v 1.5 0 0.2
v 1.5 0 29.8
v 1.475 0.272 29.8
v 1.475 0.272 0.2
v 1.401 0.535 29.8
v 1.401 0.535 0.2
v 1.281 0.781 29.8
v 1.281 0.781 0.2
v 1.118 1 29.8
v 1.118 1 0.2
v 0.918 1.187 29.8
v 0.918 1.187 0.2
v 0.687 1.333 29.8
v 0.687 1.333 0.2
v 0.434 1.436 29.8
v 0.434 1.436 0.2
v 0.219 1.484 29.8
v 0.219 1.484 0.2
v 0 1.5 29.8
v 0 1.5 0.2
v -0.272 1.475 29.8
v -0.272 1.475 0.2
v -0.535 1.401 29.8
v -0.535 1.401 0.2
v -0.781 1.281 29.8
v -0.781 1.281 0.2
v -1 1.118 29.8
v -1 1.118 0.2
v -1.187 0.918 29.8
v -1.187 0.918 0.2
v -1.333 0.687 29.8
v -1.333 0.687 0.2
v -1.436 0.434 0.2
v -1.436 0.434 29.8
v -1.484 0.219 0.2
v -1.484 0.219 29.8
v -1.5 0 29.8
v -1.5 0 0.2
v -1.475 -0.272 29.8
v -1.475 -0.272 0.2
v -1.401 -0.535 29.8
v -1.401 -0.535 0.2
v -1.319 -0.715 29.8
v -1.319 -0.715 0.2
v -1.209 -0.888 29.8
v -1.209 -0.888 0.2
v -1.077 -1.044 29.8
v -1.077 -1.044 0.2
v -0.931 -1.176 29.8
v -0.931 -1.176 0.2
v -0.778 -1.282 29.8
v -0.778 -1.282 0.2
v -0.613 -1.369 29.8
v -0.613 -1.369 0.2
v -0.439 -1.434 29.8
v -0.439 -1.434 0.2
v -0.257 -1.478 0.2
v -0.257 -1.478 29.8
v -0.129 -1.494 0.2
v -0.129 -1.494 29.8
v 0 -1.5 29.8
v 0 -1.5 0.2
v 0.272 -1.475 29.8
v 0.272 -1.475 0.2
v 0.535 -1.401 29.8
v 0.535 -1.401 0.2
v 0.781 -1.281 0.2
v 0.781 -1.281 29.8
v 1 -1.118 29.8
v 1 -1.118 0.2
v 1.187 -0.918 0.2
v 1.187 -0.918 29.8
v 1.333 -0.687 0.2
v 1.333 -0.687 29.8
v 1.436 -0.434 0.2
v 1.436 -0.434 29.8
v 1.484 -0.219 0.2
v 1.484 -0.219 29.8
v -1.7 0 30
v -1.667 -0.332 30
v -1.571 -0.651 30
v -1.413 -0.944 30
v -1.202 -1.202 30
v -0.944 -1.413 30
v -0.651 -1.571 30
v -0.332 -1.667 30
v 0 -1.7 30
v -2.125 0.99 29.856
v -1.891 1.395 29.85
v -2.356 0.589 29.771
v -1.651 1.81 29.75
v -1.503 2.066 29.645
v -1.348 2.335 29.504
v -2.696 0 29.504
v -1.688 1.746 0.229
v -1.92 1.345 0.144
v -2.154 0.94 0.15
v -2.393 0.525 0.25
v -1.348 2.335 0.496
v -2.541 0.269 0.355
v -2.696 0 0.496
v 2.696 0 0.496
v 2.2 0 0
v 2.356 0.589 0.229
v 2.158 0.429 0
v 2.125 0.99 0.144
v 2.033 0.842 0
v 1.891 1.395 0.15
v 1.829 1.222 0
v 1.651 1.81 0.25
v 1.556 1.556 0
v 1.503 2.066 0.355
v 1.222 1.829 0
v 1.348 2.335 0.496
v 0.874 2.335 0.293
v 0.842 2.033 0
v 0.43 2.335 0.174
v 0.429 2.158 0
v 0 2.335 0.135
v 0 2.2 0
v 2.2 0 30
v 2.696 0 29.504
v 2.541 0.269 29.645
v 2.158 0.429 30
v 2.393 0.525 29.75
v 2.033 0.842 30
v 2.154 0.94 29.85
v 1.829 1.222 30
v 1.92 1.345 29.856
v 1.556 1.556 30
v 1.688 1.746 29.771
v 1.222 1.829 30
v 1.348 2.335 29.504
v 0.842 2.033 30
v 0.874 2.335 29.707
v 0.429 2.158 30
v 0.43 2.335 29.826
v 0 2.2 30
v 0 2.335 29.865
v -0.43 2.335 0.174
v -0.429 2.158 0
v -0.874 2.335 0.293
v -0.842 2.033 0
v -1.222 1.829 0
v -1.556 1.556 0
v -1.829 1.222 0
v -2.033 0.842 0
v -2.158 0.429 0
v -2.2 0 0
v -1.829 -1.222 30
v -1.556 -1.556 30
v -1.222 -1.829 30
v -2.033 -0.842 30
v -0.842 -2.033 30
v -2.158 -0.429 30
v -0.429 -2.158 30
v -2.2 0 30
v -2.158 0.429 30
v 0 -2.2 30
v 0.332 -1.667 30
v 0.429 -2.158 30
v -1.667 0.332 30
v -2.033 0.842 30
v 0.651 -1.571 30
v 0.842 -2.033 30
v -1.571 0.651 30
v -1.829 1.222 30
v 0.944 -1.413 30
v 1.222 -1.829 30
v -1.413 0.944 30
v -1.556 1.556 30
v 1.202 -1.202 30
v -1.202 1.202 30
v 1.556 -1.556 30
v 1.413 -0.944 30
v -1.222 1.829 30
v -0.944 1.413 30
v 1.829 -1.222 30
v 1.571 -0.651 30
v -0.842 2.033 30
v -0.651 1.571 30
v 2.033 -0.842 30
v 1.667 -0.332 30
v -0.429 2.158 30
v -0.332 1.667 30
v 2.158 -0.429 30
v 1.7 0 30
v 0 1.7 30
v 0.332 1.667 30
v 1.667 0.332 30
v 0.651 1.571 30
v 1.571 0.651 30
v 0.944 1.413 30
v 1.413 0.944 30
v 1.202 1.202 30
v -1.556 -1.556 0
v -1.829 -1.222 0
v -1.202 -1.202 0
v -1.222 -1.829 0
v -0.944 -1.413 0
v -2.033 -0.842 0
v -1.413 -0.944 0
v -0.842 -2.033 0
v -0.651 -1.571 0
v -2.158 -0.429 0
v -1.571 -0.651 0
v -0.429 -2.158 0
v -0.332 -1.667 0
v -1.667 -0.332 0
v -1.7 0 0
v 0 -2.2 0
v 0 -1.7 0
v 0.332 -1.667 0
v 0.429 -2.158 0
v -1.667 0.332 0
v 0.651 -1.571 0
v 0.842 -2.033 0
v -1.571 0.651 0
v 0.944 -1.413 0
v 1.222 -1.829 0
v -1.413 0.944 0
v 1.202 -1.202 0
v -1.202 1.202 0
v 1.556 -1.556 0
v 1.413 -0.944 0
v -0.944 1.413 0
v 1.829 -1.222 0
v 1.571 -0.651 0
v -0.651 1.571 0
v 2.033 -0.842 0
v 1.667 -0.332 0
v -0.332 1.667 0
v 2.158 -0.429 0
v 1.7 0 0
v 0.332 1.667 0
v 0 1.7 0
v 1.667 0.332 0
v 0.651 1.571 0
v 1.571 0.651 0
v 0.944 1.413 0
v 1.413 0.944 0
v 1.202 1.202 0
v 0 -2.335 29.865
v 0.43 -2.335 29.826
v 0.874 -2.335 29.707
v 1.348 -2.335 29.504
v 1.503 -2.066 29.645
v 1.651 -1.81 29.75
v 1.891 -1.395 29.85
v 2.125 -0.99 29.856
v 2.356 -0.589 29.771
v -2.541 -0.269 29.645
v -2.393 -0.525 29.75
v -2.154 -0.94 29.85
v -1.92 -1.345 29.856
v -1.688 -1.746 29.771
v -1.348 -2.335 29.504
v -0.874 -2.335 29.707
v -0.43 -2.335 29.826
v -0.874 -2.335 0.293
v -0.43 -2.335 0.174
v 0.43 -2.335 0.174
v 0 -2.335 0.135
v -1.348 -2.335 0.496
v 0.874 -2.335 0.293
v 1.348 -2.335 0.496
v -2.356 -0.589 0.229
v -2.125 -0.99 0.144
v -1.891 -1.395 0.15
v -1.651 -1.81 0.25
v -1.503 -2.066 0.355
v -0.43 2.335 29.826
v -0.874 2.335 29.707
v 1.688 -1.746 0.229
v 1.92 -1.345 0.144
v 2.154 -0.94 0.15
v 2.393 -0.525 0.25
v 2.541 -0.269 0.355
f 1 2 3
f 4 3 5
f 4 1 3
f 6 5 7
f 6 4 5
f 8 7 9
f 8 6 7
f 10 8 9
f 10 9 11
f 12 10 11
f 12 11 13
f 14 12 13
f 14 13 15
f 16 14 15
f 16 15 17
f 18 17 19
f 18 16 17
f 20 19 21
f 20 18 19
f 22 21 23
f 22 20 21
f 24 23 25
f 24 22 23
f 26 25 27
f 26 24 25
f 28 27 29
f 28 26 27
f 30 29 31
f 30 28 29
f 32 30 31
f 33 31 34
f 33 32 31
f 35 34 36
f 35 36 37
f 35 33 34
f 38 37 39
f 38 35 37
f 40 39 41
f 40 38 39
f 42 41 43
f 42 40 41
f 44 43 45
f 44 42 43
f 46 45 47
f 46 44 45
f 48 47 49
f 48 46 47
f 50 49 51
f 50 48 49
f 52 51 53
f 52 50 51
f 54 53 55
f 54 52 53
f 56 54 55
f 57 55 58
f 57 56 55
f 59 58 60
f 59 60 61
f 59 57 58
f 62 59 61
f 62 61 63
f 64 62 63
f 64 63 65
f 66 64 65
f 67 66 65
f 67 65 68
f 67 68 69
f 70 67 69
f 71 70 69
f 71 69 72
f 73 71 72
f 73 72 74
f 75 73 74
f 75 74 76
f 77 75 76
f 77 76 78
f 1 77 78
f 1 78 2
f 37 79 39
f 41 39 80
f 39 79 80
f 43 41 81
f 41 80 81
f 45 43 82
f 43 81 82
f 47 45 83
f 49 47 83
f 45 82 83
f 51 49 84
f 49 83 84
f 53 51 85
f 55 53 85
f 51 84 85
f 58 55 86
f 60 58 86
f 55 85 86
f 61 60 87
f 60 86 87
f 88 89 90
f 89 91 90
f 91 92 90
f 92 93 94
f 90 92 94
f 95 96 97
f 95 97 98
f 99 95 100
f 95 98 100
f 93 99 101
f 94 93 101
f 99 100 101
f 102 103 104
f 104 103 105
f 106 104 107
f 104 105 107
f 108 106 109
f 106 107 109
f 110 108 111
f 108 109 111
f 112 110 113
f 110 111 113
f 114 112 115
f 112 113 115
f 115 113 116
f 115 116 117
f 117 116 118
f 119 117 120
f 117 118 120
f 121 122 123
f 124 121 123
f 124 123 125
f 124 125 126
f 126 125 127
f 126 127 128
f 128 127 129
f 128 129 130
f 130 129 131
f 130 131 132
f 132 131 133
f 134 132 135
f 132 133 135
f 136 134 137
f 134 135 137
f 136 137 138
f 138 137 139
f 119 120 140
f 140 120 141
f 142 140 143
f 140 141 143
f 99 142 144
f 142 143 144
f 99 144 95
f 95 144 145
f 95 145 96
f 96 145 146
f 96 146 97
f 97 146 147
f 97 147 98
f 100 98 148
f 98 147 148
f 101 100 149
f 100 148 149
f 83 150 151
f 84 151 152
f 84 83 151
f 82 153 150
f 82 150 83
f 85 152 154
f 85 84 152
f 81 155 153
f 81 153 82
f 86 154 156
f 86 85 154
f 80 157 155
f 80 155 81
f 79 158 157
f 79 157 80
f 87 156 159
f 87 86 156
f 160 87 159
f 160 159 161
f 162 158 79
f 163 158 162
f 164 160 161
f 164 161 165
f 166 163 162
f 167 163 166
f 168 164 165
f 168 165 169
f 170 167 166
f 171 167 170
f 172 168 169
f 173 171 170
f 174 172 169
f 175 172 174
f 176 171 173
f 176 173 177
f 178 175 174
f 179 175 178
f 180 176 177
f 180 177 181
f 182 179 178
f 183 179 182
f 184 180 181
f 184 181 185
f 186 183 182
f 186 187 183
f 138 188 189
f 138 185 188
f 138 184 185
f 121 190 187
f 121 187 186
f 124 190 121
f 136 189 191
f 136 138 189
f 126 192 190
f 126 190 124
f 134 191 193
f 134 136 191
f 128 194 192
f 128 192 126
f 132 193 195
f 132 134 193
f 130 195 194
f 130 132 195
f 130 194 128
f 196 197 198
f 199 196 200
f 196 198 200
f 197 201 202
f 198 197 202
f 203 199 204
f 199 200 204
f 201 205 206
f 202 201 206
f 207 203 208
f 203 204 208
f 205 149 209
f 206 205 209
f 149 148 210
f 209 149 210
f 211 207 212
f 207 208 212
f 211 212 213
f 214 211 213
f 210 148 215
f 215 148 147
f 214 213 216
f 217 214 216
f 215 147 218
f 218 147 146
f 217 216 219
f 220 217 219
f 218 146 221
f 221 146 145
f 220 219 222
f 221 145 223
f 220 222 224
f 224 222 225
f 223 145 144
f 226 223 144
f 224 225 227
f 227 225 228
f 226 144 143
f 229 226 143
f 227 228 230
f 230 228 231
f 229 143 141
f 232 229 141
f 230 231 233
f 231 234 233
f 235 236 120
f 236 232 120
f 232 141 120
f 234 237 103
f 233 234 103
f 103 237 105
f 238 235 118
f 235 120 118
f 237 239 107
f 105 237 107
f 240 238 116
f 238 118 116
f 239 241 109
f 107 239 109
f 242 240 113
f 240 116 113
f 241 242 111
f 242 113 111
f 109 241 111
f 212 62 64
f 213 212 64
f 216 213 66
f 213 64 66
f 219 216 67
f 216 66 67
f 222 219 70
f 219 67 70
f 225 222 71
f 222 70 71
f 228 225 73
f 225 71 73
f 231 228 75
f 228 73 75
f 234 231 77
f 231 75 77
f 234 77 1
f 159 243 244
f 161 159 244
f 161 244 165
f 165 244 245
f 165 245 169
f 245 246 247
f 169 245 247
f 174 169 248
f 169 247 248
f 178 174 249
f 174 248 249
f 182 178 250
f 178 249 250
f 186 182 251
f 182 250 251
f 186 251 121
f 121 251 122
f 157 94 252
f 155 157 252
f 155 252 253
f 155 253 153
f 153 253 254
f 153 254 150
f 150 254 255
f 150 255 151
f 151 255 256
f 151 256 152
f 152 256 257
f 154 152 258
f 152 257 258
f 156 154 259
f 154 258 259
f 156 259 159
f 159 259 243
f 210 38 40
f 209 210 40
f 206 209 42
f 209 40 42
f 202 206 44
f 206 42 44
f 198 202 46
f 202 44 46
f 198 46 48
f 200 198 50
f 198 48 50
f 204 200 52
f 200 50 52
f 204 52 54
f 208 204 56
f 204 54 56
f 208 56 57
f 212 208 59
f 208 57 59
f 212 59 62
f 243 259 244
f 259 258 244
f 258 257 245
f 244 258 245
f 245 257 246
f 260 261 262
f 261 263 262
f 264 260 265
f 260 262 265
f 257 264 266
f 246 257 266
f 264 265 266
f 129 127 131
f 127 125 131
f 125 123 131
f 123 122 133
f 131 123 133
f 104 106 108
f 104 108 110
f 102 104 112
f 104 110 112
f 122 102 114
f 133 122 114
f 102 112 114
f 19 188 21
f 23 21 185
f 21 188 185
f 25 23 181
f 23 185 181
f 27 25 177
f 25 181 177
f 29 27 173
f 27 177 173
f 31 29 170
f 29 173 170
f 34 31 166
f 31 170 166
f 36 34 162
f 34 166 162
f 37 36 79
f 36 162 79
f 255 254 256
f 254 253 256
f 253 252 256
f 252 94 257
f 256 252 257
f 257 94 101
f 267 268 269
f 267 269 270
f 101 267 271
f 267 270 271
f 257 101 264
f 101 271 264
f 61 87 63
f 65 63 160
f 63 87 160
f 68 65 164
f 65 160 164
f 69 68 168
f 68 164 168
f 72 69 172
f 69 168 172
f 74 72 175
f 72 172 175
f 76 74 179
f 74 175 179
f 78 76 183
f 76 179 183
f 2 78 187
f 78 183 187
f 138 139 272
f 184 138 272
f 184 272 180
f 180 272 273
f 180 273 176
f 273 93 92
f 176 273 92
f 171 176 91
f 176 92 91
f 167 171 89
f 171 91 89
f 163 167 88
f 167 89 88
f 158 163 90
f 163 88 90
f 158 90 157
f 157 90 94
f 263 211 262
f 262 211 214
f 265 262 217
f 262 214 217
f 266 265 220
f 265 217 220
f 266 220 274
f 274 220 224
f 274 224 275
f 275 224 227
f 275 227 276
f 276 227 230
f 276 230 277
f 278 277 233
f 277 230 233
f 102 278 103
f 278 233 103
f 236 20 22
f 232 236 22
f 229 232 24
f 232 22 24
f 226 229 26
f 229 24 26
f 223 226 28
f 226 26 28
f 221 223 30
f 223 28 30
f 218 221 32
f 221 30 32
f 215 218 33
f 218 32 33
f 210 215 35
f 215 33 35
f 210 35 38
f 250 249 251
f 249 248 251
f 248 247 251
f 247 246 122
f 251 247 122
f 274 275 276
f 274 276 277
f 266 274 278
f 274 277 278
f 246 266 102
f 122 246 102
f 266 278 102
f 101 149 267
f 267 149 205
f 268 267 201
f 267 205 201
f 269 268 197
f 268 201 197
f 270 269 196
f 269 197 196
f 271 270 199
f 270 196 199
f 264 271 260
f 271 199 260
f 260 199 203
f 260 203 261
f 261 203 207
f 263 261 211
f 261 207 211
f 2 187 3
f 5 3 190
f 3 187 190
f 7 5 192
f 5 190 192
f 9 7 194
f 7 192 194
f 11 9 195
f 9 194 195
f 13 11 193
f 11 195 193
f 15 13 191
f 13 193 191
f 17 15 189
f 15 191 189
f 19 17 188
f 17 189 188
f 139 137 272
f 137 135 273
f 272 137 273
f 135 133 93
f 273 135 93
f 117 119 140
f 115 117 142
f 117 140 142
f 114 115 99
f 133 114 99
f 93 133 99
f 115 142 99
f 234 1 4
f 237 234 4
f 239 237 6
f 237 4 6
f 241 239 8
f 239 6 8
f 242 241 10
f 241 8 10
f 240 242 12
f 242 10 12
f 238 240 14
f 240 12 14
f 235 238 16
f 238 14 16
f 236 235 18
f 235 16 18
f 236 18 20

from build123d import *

# Parameters (mm, degrees)
SKETCH_1_R      = 1.5
EXTRUDE_1_DEPTH = 30


with BuildPart() as part:
    # 草图1 → 凸台-拉伸1 (new body)
    with BuildSketch(Plane.XY):
        Polygon((2.696225757, 0), (1.348112879, 2.335), (-1.348112879, 2.335), (-2.696225757, 0), (-1.348112879, -2.335), (1.348112879, -2.335), align=None)
        Circle(SKETCH_1_R, mode=Mode.SUBTRACT)
    extrude(amount=EXTRUDE_1_DEPTH)

    # 切除-扫描1: sweep along a curve in space
    with BuildLine() as sweep_1_path:
        ThreePointArc((1.5, 0, 0), (1.060660172, 1.060660172, 0), (0, 1.5, 0))
        ThreePointArc((0, 1.5, 0), (-1.060660172, 1.060660172, 0), (-1.5, 0, 0))
        ThreePointArc((-1.5, 0, 0), (-1.060660172, -1.060660172, 0), (0, -1.5, 0))
        ThreePointArc((0, -1.5, 0), (1.060660172, -1.060660172, 0), (1.5, 0, 0))
    # 草图2 → 切除-扫描1 (sweep, cut)
    with BuildSketch(Plane(origin=(0, 0, 0), x_dir=(0, 0, -1), z_dir=(1, 0, 0))):
        Polygon((-0.27716486, 1.42283514), (0.101677918, 1.801677918), (0.101677918, 1.42283514), align=None)
        Polygon((0.0715027, 2.1284973), (-0.9284973, 3.1284973), (0.0715027, 3.1284973), align=None)
        Polygon((-29.72283514, 1.42283514), (-30.101677918, 1.801677918), (-30.101677918, 1.42283514), align=None)
        Polygon((-29.0715027, 3.1284973), (-30.0715027, 3.1284973), (-30.0715027, 2.1284973), align=None)
    sweep(path=sweep_1_path.line, mode=Mode.SUBTRACT)


solid = part.part
